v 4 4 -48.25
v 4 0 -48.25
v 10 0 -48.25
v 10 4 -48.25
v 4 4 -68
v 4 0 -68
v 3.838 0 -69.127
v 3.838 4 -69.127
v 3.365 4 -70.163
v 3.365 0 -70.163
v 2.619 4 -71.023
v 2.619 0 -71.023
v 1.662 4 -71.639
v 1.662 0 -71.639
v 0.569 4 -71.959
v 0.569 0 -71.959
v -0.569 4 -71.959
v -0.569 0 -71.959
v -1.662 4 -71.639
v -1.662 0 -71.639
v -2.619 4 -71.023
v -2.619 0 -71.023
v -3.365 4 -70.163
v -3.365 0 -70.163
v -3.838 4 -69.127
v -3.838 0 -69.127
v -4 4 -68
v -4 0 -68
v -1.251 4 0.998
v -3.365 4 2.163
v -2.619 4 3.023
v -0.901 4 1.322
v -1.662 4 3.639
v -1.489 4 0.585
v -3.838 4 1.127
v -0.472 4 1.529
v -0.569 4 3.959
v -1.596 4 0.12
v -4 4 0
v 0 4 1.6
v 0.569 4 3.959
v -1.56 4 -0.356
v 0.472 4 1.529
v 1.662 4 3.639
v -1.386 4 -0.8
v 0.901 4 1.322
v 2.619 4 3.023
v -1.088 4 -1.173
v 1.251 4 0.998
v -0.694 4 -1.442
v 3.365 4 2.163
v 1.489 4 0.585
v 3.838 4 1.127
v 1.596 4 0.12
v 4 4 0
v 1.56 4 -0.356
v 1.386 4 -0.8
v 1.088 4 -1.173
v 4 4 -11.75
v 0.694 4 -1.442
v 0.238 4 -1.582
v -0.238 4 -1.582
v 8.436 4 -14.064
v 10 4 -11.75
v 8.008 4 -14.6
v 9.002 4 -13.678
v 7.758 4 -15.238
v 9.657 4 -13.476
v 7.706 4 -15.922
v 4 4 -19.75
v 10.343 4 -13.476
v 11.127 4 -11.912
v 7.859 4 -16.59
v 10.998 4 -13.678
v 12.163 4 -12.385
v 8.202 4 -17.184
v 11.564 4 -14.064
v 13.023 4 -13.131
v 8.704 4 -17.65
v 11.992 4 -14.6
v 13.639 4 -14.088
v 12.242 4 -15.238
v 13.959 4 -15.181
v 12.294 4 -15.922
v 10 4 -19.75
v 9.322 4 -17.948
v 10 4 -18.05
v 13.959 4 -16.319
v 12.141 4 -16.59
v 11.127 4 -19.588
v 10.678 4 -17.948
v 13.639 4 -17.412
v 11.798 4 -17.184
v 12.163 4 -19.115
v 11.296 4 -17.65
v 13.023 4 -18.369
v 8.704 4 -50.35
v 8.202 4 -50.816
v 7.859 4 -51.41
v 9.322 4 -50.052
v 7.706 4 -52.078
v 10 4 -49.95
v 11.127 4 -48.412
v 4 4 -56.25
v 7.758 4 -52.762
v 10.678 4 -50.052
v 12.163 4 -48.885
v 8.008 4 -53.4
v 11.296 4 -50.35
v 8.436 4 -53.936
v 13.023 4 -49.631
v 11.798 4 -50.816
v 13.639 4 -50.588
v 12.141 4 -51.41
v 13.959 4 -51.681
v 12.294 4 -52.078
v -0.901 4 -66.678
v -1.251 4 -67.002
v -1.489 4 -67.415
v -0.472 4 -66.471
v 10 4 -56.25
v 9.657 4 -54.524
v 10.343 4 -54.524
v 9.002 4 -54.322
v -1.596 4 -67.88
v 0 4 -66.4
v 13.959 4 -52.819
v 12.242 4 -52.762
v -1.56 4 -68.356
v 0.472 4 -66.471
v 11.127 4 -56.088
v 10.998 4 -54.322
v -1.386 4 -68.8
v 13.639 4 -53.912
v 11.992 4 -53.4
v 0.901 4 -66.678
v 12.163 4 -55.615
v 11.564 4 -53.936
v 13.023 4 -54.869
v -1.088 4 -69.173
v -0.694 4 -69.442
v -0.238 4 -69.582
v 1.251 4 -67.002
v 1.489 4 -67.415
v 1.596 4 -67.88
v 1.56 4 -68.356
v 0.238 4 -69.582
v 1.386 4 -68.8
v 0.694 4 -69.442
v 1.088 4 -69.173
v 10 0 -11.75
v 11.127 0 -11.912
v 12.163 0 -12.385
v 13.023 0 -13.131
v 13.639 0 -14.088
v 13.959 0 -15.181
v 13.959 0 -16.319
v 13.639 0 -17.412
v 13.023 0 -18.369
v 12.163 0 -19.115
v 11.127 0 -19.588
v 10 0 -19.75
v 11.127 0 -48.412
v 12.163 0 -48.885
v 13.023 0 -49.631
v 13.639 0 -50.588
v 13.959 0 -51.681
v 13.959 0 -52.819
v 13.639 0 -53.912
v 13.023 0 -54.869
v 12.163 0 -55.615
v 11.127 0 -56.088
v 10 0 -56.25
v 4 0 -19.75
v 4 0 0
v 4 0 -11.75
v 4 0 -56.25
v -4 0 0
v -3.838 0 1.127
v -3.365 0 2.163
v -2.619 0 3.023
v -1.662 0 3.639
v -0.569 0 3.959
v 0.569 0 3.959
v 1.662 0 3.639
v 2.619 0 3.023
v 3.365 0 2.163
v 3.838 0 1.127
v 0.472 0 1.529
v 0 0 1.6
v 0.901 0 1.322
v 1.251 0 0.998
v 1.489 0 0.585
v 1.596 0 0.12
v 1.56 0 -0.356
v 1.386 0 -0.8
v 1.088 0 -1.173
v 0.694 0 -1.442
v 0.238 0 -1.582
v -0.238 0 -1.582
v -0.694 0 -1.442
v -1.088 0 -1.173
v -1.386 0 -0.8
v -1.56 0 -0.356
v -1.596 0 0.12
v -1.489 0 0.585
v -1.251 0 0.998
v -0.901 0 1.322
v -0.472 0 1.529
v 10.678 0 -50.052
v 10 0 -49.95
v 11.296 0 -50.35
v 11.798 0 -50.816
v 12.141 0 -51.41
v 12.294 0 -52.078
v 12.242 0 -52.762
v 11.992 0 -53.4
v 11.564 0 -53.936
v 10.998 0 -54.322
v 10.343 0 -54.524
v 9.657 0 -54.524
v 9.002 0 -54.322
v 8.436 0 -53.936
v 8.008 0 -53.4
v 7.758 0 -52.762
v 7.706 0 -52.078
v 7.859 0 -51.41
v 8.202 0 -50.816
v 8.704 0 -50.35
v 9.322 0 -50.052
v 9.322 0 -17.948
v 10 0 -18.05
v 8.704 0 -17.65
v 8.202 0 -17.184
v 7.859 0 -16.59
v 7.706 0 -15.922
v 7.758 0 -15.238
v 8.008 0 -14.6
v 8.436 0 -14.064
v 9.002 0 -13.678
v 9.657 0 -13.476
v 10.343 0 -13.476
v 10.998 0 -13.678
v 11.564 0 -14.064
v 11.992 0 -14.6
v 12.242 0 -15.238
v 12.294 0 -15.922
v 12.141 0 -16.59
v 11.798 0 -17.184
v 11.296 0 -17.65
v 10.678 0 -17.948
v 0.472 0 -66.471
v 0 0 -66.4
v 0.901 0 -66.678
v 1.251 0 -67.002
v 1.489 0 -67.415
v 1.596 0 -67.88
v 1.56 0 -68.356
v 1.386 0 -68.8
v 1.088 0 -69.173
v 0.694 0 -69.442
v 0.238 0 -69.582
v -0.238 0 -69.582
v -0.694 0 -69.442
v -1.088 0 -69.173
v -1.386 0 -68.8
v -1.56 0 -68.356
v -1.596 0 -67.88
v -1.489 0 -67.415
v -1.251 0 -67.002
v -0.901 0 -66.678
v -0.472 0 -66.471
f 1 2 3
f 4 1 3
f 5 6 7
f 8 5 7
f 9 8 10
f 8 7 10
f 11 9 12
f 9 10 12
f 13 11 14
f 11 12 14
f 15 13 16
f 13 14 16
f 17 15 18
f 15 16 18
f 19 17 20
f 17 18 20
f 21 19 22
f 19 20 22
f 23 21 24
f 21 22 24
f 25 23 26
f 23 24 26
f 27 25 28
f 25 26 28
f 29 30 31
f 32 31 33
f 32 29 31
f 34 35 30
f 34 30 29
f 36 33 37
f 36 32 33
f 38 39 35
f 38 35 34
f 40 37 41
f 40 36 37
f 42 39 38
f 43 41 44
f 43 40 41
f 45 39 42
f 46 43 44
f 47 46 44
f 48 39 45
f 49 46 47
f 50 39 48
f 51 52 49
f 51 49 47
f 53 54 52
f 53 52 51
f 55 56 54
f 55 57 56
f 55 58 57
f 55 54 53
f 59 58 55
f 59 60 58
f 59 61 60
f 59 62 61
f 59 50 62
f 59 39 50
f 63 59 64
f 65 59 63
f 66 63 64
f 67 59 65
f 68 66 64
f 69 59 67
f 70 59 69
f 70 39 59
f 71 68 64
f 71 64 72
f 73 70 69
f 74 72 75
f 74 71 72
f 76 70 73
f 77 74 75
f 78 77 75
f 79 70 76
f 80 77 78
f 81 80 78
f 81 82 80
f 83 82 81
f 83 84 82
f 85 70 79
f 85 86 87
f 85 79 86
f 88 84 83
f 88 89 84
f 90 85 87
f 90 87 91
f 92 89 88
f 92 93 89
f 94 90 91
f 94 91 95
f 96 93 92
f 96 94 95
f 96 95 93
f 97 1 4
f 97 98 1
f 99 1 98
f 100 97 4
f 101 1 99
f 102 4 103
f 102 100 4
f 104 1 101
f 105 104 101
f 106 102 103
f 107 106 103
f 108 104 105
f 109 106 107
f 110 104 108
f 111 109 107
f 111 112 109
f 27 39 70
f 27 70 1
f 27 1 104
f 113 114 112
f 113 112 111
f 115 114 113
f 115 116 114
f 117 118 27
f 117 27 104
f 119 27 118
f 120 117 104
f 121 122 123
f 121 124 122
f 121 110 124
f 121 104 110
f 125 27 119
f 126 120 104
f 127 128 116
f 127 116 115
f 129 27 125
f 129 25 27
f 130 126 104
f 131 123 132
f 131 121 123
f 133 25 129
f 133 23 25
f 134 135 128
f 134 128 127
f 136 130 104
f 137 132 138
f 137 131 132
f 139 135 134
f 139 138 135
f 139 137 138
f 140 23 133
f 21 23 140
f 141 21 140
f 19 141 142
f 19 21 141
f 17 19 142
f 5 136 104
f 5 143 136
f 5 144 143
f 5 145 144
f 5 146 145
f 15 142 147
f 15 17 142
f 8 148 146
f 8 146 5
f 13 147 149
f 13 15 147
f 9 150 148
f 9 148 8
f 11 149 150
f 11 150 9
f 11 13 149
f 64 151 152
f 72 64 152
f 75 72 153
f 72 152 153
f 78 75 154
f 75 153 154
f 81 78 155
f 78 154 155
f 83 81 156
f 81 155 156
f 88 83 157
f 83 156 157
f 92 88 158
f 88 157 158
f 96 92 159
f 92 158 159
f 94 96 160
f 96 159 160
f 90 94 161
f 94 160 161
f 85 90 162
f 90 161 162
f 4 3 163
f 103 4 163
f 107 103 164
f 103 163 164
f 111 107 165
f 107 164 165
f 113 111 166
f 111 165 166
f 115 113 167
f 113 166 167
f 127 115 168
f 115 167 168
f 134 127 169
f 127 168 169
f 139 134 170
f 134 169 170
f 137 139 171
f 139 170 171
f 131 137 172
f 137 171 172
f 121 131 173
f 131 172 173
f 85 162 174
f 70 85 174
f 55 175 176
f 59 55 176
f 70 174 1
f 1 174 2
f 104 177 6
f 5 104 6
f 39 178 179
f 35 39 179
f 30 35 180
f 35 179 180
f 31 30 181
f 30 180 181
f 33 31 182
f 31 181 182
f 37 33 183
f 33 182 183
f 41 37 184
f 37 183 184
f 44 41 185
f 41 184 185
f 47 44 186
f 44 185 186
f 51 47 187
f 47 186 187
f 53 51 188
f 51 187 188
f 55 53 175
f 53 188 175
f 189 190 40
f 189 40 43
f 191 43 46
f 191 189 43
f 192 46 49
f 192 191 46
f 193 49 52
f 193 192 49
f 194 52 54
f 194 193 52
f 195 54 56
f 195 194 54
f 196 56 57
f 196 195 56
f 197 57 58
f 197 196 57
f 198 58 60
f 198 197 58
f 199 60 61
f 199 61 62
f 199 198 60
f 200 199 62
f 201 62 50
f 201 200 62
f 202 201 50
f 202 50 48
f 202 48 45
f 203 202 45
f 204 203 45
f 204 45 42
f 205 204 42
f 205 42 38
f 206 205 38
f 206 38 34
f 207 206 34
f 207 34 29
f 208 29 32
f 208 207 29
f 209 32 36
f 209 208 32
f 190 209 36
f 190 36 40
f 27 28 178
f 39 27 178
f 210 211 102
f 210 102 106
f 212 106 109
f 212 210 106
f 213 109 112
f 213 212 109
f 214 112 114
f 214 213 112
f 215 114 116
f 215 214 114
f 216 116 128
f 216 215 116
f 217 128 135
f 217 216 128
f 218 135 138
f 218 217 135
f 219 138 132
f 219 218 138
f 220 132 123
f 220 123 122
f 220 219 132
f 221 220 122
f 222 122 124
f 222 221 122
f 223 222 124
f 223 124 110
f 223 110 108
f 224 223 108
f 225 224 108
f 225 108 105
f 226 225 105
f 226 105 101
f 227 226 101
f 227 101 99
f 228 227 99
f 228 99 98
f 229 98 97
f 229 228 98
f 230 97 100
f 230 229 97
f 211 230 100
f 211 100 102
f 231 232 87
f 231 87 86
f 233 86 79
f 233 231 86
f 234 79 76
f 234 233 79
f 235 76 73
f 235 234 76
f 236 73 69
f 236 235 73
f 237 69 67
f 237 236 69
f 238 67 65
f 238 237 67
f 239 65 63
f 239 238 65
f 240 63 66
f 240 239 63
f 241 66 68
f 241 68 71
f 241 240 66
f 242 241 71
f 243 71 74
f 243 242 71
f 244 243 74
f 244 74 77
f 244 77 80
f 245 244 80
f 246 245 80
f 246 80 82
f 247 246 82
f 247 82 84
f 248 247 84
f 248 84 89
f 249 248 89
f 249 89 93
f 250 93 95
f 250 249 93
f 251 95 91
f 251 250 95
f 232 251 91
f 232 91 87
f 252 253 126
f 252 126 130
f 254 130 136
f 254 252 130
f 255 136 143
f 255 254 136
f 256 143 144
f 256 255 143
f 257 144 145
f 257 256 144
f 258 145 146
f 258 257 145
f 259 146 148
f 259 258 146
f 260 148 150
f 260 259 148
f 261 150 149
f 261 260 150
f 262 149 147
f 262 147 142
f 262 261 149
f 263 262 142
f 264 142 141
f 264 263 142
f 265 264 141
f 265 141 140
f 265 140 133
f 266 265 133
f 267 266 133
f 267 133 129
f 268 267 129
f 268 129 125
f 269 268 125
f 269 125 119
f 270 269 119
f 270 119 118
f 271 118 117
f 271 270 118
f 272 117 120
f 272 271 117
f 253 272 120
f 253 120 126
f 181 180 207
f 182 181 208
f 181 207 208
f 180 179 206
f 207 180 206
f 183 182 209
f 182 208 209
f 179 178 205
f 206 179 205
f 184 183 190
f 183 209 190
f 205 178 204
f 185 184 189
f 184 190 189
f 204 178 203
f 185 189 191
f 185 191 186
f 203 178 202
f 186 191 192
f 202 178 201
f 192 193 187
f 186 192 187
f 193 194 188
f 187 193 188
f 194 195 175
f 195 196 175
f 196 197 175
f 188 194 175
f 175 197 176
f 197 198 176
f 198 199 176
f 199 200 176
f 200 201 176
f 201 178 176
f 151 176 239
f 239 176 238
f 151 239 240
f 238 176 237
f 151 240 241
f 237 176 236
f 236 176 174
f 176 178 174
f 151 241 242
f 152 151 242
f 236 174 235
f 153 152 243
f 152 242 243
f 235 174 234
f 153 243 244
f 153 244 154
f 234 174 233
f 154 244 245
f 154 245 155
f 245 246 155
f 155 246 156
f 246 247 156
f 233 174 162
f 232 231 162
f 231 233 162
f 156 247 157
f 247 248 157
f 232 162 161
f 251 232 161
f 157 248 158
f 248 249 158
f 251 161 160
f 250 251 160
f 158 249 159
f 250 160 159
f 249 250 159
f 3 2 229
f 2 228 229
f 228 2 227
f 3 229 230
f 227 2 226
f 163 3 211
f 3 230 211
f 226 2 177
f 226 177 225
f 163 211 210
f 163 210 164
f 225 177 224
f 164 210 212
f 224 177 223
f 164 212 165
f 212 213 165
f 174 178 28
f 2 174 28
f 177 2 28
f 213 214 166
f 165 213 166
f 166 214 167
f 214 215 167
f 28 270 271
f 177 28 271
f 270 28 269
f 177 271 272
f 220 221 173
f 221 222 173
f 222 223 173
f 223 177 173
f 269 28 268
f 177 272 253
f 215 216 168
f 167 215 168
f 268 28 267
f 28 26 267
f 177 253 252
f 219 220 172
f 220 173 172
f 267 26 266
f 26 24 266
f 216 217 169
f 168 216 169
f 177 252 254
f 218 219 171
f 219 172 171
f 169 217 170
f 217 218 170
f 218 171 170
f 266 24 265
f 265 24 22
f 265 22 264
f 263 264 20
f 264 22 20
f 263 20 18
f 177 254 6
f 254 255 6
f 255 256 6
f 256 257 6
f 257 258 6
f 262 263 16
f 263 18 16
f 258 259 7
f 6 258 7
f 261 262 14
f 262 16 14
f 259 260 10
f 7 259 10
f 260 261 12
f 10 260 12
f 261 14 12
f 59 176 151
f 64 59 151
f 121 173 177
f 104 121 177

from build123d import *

# Parameters (mm, degrees)
SKETCH1_R           = 1.6
SKETCH1_R_2         = 2.3
BOSS_EXTRUDE1_DEPTH = 4


with BuildPart() as part:
    # Sketch1 → Boss-Extrude1 (new body)
    with BuildSketch(Plane(origin=(0, 0, 0), x_dir=(1, 0, 0), z_dir=(0, 1, 0))):
        with BuildLine():
            Line((-4, 68), (-4, 0))
            ThreePointArc((-4, 0), (0, -4), (4, 0))
            Line((4, 0), (4, 11.75))
            Line((4, 11.75), (10, 11.75))
            ThreePointArc((10, 11.75), (14, 15.75), (10, 19.75))
            Line((10, 19.75), (4, 19.75))
            Line((4, 19.75), (4, 48.25))
            Line((4, 48.25), (10, 48.25))
            ThreePointArc((10, 48.25), (14, 52.25), (10, 56.25))
            Line((10, 56.25), (4, 56.25))
            Line((4, 56.25), (4, 68))
            ThreePointArc((4, 68), (0, 72), (-4, 68))
        make_face()
        with Locations(Location((0, 68, 0), (0, 0, 270))):
            Circle(SKETCH1_R, mode=Mode.SUBTRACT)
        with Locations(Location((0, 0, 0), (0, 0, 270))):
            Circle(SKETCH1_R, mode=Mode.SUBTRACT)
        with Locations(Location((10, 52.25, 0), (0, 0, 270))):
            Circle(SKETCH1_R_2, mode=Mode.SUBTRACT)
        with Locations(Location((10, 15.75, 0), (0, 0, 90))):
            Circle(SKETCH1_R_2, mode=Mode.SUBTRACT)
    extrude(amount=BOSS_EXTRUDE1_DEPTH)


solid = part.part
